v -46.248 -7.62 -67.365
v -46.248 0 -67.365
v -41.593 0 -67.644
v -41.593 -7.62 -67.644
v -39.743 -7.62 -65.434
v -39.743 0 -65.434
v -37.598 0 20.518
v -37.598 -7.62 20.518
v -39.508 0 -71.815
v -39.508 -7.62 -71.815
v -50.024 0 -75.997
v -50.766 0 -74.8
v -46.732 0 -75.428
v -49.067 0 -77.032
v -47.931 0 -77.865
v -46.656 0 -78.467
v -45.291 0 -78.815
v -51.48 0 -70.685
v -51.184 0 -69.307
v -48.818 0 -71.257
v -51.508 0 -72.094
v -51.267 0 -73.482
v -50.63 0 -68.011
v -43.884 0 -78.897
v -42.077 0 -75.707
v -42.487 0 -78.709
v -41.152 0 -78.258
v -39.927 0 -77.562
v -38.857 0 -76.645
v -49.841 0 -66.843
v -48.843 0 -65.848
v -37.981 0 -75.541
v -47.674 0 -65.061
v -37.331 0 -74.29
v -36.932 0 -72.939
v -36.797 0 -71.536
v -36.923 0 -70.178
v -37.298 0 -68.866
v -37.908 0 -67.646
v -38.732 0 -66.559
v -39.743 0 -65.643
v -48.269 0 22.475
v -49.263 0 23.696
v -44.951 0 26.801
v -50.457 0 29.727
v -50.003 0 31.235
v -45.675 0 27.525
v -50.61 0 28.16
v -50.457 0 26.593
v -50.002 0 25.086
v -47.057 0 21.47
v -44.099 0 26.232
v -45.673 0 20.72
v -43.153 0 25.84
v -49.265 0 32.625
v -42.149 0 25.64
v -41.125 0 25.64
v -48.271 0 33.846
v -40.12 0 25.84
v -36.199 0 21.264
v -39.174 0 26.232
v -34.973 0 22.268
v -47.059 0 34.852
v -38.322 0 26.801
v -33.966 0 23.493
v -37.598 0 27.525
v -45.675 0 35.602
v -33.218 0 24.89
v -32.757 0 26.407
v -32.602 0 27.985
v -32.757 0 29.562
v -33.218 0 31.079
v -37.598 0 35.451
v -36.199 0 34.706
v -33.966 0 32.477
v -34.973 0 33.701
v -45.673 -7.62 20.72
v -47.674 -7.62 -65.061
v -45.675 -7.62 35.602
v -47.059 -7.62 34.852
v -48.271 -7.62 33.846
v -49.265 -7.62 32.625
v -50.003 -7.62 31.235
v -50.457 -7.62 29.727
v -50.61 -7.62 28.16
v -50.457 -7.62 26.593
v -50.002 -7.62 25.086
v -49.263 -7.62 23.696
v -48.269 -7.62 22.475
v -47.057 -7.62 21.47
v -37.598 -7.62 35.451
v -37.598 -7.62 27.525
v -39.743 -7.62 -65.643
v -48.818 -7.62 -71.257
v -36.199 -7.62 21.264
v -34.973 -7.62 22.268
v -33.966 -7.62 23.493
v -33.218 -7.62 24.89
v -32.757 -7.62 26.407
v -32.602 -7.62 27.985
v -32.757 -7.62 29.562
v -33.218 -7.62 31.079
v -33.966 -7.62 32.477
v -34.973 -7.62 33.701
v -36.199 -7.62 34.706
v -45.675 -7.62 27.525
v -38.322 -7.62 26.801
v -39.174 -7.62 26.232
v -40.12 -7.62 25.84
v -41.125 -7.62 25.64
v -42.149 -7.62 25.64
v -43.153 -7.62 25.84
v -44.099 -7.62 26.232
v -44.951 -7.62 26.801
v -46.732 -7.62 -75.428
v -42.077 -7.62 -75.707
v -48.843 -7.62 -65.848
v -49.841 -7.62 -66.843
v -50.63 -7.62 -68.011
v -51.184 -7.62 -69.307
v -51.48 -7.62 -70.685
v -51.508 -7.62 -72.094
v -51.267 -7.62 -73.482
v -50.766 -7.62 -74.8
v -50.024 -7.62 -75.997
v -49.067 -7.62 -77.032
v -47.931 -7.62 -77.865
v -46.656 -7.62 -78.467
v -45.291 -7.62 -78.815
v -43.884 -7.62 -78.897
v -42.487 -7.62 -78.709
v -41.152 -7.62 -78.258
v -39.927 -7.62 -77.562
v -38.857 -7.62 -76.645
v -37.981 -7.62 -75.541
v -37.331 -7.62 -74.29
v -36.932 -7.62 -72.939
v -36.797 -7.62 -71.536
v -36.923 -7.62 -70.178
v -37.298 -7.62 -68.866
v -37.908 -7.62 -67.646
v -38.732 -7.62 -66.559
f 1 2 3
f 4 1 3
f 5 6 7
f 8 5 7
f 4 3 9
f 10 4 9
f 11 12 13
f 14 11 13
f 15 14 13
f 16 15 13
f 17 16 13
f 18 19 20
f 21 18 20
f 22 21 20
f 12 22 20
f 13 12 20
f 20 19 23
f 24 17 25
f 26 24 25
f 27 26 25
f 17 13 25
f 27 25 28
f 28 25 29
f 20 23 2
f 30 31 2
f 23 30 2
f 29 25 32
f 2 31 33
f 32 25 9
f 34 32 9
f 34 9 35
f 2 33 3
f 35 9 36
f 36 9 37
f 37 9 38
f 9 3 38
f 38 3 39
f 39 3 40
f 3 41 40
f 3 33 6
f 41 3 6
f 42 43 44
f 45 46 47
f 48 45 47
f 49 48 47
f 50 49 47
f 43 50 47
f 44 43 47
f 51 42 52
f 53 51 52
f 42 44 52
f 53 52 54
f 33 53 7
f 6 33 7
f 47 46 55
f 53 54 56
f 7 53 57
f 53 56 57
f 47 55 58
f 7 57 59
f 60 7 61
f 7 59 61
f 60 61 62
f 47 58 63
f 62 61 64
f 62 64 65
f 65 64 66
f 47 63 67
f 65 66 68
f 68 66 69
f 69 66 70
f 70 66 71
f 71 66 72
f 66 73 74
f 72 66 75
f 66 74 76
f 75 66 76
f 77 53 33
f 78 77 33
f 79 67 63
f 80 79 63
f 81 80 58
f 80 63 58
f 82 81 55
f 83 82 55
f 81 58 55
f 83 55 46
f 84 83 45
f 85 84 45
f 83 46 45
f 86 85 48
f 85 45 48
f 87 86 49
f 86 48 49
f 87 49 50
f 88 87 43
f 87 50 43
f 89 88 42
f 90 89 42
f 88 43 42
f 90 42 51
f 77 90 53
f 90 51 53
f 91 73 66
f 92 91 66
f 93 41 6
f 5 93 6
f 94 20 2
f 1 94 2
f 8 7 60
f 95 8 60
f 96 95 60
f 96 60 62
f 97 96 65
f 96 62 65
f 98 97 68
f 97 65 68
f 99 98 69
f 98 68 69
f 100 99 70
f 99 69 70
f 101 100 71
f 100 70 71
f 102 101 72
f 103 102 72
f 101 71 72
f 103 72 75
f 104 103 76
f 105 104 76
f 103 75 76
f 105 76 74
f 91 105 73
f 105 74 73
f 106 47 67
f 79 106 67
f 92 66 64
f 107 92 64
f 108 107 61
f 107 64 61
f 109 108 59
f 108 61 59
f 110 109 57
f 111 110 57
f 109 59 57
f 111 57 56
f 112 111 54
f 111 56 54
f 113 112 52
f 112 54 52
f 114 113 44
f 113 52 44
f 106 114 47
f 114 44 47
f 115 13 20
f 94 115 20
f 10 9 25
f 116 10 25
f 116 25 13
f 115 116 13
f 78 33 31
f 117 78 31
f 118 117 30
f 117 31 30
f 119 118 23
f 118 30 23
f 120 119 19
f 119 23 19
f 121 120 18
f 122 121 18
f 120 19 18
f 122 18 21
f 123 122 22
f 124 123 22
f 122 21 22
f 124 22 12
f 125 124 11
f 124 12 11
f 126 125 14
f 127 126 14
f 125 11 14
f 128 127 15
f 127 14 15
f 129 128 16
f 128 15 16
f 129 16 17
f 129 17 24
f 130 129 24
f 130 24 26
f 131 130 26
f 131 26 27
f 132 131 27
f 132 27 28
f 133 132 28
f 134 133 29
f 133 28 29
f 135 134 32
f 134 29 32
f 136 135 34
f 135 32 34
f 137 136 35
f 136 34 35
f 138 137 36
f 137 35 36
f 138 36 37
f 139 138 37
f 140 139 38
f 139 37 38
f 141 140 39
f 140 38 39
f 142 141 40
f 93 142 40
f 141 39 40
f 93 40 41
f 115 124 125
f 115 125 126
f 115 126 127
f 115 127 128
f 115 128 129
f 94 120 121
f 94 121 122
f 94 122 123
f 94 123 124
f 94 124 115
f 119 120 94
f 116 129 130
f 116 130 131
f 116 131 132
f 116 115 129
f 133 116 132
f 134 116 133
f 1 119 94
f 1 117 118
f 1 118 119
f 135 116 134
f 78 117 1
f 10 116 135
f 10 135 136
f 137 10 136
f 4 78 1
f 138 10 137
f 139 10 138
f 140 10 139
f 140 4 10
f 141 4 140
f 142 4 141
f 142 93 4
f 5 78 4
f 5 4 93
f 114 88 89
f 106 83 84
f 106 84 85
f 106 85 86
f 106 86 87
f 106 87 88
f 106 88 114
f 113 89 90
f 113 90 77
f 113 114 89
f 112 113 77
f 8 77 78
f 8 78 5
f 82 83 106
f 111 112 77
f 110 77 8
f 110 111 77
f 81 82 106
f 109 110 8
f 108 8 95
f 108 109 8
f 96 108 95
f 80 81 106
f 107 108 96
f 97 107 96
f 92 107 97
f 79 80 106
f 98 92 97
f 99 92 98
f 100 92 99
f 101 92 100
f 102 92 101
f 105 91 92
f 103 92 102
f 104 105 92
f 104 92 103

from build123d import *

# Parameters (mm, degrees)
F1_DEPTH = 6.35
F2_DEPTH = 7.62


with BuildPart() as f1:
    # F0 (on Front) → F1 (new body)
    with BuildSketch(Plane.XZ):
        with BuildLine():
            Line((-39.743337, -65.643214), (-39.743337, -65.434216))
            Line((-39.743337, -65.434216), (-37.598322, 20.518023))
            Line((-37.598322, 20.518023), (-45.673008, 20.719534))
            Line((-45.673008, 20.719534), (-47.674275, -65.06083))
            ThreePointArc((-47.674275, -65.06083), (-43.623463, -64.189814), (-39.743337, -65.643214))
        make_face()
    extrude(amount=F1_DEPTH)

    # F0 (on Front) → F2 (join)
    with BuildSketch(Plane.XZ):
        with BuildLine():
            Line((-39.743337, -65.643214), (-39.743337, -65.434216))
            Line((-39.743337, -65.434216), (-37.598322, 20.518023))
            Line((-37.598322, 20.518023), (-45.673008, 20.719534))
            Line((-45.673008, 20.719534), (-47.674275, -65.06083))
            ThreePointArc((-47.674275, -65.06083), (-43.623463, -64.189814), (-39.743337, -65.643214))
        make_face()
        with BuildLine():
            Line((-45.673008, 20.719534), (-37.598322, 20.518023))
            ThreePointArc((-37.598322, 20.518023), (-32.601753, 27.984673), (-37.598322, 35.451324))
            Line((-37.598322, 35.451324), (-37.598322, 27.525249))
            ThreePointArc((-37.598322, 27.525249), (-41.636713, 25.615004), (-45.675104, 27.525249))
            Line((-45.675104, 27.525249), (-45.675104, 35.602449))
            ThreePointArc((-45.675104, 35.602449), (-50.610258, 28.160296), (-45.673008, 20.719534))
        make_face()
        with BuildLine():
            ThreePointArc((-36.79691, -71.536034), (-37.574567, -68.241844), (-39.743337, -65.643214))
            ThreePointArc((-39.743337, -65.643214), (-43.623463, -64.189814), (-47.674275, -65.06083))
            ThreePointArc((-47.674275, -65.06083), (-47.930751, -77.865437), (-36.79691, -71.536034))
        make_face()
        Polygon((-46.248433, -67.364986), (-41.593438, -67.644394), (-39.507915, -71.815443), (-42.077387, -75.707083), (-46.732383, -75.427675), (-48.817906, -71.256626), align=None, mode=Mode.SUBTRACT)
    extrude(amount=F2_DEPTH)


solid = f1.part
